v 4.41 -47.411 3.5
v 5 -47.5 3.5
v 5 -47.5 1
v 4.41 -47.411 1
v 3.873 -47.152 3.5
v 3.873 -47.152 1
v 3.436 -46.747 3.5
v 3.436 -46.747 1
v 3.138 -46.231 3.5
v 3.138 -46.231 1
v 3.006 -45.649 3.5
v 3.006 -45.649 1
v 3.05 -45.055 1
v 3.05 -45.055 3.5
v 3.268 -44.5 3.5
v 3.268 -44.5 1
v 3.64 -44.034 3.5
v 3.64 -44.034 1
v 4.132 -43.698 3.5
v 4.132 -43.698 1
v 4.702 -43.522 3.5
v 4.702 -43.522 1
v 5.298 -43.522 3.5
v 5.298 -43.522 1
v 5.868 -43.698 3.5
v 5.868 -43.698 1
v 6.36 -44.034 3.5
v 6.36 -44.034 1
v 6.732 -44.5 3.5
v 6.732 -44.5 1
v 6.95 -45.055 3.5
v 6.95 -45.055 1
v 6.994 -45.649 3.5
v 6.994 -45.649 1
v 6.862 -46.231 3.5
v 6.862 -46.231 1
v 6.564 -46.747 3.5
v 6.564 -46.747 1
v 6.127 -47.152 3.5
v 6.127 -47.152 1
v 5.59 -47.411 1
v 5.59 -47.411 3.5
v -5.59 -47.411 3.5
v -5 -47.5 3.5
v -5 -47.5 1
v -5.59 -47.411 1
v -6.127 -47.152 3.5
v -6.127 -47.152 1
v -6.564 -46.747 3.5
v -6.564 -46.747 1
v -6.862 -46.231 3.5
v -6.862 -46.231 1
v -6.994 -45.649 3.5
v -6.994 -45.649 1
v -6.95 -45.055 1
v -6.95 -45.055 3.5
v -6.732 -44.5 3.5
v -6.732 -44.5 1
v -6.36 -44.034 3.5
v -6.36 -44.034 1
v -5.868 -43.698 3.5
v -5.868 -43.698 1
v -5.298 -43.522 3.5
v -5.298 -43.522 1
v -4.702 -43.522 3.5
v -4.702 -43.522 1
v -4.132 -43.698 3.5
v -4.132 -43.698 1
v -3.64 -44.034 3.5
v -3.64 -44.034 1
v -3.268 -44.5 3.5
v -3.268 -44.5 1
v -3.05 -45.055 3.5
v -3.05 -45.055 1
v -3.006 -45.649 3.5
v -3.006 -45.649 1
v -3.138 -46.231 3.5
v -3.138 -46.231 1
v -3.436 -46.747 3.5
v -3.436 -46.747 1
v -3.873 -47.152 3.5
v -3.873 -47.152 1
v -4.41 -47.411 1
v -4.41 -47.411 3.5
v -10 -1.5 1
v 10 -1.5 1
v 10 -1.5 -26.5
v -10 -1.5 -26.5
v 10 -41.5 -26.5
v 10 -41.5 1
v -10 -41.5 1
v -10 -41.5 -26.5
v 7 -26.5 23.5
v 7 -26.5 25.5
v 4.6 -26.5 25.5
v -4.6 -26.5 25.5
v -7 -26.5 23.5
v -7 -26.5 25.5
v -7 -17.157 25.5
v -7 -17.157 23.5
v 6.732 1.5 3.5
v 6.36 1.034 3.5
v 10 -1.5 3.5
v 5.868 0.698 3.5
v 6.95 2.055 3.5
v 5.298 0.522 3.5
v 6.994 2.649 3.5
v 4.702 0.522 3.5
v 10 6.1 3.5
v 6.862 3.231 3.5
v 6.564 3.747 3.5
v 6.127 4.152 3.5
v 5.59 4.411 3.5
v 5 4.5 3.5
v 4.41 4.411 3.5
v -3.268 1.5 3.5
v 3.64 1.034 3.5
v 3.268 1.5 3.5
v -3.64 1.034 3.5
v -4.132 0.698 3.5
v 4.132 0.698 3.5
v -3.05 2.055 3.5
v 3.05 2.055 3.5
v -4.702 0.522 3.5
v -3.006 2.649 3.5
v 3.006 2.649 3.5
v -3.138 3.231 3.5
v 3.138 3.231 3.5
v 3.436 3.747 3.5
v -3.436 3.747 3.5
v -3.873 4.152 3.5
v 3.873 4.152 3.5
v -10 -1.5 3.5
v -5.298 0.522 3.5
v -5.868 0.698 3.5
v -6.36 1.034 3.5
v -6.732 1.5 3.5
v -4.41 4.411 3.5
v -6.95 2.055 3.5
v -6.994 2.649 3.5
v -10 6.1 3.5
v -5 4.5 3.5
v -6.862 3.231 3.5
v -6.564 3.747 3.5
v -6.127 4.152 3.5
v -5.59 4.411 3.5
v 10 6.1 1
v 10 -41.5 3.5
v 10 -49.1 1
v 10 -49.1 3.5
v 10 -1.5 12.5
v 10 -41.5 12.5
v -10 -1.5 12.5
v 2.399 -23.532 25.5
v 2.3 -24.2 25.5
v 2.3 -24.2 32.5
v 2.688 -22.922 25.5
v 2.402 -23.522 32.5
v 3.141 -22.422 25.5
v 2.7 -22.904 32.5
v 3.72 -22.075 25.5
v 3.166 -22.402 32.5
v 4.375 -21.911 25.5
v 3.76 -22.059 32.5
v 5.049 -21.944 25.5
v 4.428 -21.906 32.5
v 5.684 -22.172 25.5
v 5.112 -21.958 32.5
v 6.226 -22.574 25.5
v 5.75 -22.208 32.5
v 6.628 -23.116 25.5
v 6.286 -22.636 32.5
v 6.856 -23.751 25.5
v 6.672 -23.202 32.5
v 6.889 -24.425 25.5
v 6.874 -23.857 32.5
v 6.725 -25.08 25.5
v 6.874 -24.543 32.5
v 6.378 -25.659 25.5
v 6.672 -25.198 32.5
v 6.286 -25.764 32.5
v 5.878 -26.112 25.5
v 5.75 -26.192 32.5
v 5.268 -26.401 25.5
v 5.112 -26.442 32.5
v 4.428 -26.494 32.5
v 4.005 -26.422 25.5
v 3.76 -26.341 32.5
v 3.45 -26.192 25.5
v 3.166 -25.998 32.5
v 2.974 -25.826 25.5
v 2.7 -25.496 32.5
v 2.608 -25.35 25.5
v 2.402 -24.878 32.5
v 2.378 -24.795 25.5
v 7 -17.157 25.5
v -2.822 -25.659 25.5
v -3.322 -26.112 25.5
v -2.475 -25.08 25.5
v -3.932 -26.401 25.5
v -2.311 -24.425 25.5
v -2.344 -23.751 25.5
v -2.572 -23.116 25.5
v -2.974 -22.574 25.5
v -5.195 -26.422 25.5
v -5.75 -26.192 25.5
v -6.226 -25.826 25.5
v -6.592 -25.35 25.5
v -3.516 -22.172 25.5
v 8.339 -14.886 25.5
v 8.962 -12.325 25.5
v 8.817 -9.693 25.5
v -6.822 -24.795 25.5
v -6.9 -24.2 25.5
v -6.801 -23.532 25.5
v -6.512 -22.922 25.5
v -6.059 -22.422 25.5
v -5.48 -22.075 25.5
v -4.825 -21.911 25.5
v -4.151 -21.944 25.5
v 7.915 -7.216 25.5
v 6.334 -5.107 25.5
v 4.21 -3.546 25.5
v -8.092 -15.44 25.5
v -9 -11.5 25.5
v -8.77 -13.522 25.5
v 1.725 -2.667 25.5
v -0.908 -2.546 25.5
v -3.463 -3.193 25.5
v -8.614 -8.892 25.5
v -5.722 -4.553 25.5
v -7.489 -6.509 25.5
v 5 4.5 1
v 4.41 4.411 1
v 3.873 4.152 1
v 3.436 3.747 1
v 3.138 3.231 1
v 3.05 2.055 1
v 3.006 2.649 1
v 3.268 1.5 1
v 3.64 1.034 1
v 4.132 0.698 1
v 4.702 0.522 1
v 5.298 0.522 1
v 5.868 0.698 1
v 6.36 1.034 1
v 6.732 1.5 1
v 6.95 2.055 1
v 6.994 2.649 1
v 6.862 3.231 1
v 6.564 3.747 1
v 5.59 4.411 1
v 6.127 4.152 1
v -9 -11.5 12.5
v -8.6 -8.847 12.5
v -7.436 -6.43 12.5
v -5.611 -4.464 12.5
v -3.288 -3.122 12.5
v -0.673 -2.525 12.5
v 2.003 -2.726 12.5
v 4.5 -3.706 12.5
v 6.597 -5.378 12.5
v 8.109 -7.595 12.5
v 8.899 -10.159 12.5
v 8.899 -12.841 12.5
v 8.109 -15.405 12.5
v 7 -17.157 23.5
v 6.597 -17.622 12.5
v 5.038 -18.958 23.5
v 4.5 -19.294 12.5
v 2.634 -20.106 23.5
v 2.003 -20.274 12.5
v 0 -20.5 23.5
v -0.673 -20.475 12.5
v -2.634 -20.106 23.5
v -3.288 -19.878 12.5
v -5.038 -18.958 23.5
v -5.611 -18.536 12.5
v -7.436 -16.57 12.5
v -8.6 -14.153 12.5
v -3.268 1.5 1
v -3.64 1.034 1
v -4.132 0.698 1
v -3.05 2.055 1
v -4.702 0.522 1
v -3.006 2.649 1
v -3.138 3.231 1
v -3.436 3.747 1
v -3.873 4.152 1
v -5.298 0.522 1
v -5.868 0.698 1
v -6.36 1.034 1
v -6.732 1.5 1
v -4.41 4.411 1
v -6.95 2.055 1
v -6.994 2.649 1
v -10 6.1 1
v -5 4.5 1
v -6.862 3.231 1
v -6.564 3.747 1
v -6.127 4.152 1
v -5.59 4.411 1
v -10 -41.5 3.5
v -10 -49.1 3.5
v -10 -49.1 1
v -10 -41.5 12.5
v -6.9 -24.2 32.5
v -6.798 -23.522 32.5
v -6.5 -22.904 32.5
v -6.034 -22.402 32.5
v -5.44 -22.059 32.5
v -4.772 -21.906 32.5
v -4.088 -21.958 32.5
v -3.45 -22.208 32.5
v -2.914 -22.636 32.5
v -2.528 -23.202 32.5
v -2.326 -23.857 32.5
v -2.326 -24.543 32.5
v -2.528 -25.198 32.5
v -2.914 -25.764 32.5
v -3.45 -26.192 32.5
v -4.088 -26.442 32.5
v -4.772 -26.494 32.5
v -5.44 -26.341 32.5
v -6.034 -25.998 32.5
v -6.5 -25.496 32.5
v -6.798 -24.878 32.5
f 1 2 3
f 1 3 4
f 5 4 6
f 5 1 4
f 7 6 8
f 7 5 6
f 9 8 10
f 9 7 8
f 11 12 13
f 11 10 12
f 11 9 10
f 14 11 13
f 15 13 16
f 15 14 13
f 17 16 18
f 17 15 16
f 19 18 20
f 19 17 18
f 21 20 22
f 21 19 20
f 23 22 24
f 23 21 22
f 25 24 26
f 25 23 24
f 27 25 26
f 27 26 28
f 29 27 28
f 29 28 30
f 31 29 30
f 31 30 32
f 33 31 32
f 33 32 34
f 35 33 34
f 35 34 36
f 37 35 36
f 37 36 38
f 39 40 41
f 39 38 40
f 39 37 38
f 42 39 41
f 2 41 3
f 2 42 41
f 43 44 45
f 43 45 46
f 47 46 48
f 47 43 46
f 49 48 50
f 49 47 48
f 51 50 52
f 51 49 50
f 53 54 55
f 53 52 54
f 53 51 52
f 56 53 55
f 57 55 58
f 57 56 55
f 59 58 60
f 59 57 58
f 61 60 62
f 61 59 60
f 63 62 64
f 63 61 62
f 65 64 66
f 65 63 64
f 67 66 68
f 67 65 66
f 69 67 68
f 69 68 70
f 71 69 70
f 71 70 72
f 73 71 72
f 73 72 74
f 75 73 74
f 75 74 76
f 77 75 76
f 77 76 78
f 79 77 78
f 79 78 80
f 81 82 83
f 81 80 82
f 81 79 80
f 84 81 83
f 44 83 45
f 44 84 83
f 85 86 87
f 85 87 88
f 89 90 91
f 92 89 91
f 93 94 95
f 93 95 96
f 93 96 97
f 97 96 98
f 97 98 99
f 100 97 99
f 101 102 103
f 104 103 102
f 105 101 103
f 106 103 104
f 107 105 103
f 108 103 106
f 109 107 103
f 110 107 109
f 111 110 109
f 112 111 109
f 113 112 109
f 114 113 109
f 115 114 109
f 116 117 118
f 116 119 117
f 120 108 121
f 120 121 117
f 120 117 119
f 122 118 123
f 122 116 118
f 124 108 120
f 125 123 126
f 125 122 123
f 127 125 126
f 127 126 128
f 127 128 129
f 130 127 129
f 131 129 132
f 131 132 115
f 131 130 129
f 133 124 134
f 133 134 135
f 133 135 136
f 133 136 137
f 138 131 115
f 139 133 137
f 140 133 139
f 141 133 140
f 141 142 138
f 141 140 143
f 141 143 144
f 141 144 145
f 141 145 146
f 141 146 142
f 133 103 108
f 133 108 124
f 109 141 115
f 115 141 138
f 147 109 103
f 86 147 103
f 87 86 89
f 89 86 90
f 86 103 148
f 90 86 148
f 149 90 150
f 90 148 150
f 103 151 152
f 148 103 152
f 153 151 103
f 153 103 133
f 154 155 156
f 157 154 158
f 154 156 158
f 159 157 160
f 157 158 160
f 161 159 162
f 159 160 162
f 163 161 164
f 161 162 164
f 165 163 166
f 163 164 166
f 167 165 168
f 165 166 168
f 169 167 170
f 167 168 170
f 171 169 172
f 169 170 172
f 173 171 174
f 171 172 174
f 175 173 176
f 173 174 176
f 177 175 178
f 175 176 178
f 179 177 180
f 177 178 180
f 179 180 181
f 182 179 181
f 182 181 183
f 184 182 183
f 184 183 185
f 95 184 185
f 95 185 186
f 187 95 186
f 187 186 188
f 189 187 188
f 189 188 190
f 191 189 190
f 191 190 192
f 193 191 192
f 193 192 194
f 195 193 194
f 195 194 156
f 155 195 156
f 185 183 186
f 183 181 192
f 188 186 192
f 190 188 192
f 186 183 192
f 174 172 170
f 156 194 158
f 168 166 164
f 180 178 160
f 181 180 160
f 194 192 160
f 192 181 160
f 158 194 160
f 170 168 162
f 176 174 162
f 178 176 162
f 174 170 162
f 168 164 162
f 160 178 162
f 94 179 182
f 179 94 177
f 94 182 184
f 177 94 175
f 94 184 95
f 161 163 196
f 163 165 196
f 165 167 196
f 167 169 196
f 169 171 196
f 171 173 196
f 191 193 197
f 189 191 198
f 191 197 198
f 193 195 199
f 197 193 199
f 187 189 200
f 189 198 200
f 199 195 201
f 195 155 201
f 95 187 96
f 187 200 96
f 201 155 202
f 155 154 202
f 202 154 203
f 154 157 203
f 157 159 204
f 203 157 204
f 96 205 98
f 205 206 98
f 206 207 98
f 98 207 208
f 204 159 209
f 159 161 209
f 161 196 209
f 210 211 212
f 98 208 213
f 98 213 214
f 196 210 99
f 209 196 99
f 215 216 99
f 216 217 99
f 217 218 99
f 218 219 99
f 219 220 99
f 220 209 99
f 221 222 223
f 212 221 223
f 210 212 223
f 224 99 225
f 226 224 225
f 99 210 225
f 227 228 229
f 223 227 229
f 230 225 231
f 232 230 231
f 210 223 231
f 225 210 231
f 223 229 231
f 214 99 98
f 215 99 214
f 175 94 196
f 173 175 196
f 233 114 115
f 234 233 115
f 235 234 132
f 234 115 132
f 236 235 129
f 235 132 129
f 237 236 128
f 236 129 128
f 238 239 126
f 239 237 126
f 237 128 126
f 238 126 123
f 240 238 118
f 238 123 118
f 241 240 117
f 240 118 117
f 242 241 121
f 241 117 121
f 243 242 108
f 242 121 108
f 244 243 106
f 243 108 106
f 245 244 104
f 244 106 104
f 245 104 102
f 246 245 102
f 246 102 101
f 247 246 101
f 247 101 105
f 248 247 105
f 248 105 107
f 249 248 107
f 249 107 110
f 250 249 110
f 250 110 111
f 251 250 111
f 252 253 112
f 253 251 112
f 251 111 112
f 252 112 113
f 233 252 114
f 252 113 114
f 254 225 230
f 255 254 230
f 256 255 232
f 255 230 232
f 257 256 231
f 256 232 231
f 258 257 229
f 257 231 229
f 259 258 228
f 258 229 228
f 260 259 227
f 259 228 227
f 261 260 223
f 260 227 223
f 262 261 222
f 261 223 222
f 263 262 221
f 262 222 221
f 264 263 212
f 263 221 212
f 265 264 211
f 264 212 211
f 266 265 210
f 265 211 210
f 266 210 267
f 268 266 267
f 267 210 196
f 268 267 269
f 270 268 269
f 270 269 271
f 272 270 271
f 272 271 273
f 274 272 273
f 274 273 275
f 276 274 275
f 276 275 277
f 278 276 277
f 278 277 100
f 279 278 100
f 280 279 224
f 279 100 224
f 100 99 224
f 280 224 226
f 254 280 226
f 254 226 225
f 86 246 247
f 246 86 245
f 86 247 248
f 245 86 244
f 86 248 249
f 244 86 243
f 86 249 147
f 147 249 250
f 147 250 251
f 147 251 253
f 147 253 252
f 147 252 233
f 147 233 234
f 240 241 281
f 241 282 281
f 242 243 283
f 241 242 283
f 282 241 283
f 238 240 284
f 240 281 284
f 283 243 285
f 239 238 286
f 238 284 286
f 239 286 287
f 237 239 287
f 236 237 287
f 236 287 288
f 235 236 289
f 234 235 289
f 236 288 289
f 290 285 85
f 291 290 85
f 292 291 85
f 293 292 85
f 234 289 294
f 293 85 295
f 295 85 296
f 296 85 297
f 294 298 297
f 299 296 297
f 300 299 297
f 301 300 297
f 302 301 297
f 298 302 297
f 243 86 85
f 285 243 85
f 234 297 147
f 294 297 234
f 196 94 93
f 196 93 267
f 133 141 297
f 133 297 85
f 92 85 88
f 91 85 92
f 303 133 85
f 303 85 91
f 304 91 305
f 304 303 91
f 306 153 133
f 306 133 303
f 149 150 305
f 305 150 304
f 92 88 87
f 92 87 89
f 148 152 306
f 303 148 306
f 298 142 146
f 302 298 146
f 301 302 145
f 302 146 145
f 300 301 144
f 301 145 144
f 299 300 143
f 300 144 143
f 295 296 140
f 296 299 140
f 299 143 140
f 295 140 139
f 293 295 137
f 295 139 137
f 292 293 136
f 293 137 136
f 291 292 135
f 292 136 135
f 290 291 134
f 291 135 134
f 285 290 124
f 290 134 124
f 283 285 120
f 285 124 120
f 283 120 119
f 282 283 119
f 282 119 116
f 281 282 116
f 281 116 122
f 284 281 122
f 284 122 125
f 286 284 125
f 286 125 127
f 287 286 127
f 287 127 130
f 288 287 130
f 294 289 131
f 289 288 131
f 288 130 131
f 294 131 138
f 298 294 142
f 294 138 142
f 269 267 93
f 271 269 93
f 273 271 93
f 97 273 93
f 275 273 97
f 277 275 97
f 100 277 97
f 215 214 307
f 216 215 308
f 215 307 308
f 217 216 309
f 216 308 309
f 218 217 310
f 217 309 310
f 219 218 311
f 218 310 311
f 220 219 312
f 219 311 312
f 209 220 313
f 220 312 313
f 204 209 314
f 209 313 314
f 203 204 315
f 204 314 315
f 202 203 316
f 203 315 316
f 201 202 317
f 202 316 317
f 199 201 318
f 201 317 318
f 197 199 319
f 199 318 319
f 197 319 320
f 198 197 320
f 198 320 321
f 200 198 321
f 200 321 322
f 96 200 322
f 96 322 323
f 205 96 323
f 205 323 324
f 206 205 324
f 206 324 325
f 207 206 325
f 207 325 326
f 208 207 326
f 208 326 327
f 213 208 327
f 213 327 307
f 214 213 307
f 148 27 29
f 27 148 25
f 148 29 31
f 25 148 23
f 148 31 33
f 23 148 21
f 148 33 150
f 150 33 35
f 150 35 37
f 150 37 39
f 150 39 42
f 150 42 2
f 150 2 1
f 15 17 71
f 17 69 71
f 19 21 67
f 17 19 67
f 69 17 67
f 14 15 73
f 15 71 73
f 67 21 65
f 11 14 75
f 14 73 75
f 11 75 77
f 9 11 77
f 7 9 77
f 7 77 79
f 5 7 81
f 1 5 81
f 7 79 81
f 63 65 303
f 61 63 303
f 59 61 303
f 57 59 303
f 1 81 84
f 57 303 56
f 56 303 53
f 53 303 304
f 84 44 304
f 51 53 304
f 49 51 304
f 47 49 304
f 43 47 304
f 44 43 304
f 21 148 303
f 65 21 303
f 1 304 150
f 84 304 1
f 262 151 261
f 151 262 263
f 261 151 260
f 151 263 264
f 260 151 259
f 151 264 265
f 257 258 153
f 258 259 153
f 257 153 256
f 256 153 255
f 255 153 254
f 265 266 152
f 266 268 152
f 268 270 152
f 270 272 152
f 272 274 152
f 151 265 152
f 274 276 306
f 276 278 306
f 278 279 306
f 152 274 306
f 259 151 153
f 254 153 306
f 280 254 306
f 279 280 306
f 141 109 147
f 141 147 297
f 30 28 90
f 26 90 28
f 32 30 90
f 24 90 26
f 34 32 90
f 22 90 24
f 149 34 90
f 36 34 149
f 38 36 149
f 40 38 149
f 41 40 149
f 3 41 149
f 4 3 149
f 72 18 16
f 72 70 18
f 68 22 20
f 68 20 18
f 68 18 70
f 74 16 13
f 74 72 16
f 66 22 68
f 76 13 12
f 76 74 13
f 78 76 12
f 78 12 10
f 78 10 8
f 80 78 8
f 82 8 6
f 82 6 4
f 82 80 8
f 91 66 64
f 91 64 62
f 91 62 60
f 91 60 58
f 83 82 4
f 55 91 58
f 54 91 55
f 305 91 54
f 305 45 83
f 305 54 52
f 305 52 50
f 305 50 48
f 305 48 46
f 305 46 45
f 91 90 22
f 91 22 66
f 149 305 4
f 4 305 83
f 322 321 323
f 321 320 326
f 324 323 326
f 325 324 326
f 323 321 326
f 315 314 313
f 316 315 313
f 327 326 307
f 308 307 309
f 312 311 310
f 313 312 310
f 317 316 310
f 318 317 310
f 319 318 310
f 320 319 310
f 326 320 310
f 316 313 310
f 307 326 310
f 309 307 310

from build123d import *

# Parameters (mm, degrees)
CYLINDER001_R             = 2
CYLINDER001_DEPTH         = 10
CYLINDER_R                = 2
CYLINDER_DEPTH            = 10
BOX001_W                  = 7.6
BOX001_H                  = 20
BOX001_DEPTH              = 2.5
BOX_W                     = 40
BOX_H                     = 20
BOX_DEPTH                 = 39
BOX002_W                  = 14
BOX002_H                  = 16
BOX002_DEPTH              = 2
CYLINDER002_R             = 9
CYLINDER002_DEPTH         = 13
CYLINDER004_R             = 2.3
CYLINDER004_DEPTH         = 7
CYLINDER003_R             = 2.3
CYLINDER003_DEPTH         = 7
FUSION009_PLACEMENT_ANGLE = 90
BODY_ROLL_ANGLE           = 180
BODY_PLACEMENT_ANGLE      = -90


with BuildPart() as cylinder001:
    # Cylinder001 → Cylinder001 (new body)
    with BuildSketch(Plane(origin=(44, 15, 5), x_dir=(1, 0, 0), z_dir=(0, 0, 1))):
        Circle(CYLINDER001_R)
    extrude(amount=CYLINDER001_DEPTH)


with BuildPart() as fusion:
    # Cylinder → Cylinder (new body)
    with BuildSketch(Plane(origin=(44, 5, 5), x_dir=(1, 0, 0), z_dir=(0, 0, 1))):
        Circle(CYLINDER_R)
    extrude(amount=CYLINDER_DEPTH)

    # Fusion: union Cylinder001
    add(cylinder001.part)


with BuildPart() as cut:
    # Box001 → Box001 (new body)
    with BuildSketch(Plane(origin=(40, 0, 9), x_dir=(1, 0, 0), z_dir=(0, 0, 1))):
        with Locations((3.8, 10)):
            Rectangle(BOX001_W, BOX001_H)
    extrude(amount=BOX001_DEPTH)

    # Cut: cut Fusion
    add(fusion.part, mode=Mode.SUBTRACT)


with BuildPart() as cut_1:
    # Cut placement: moved
    add(cut.part.moved(Location((-10, -10, 0))))


with BuildPart() as part_mirroring:
    # Part__Mirroring: instance of Cut
    add(cut_1.part.mirror(Plane(origin=(0, 0, 0), x_dir=(0, -1, 0), z_dir=(1, 0, 0))))


with BuildPart() as part_mirroring_1:
    # Part__Mirroring placement: moved
    add(part_mirroring.part.moved(Location((20, 0, 0))))


with BuildPart() as fusion010:
    # Box → Box (new body)
    with BuildSketch(Plane(origin=(-10, -10, 0), x_dir=(1, 0, 0), z_dir=(0, 0, 1))):
        with Locations((20, 10)):
            Rectangle(BOX_W, BOX_H)
    extrude(amount=BOX_DEPTH)

    # Fusion010: union Part__Mirroring, Cut
    add(part_mirroring_1.part)
    add(cut_1.part)


with BuildPart() as cube002:
    # Box002 → Box002 (new body)
    with BuildSketch(Plane(origin=(-7, -15, 0), x_dir=(1, 0, 0), z_dir=(0, 0, 1))):
        with Locations((7, 8)):
            Rectangle(BOX002_W, BOX002_H)
    extrude(amount=BOX002_DEPTH)


with BuildPart() as shaft:
    # Cylinder002 → Cylinder002 (new body)
    with BuildSketch(Plane.XY):
        Circle(CYLINDER002_R)
    extrude(amount=CYLINDER002_DEPTH)


with BuildPart() as cylinder004:
    # Cylinder004 → Cylinder004 (new body)
    with BuildSketch(Plane(origin=(4.6, -12.7, -7), x_dir=(1, 0, 0), z_dir=(0, 0, 1))):
        Circle(CYLINDER004_R)
    extrude(amount=CYLINDER004_DEPTH)


with BuildPart() as servo:
    # Cylinder003 → Cylinder003 (new body)
    with BuildSketch(Plane(origin=(-4.6, -12.7, -7), x_dir=(1, 0, 0), z_dir=(0, 0, 1))):
        Circle(CYLINDER003_R)
    extrude(amount=CYLINDER003_DEPTH)

    # Fusion009: union Cube002, shaft, Cylinder004
    add(cube002.part)
    add(shaft.part)
    add(cylinder004.part)


with BuildPart() as servo_1:
    # Fusion009 placement: moved
    add(servo.part.moved(Location((0, 0, -13))).rotate(Axis((0, 0, -13), (0, 0, 1)), FUSION009_PLACEMENT_ANGLE))

    # Fusion011: union Fusion010
    add(fusion010.part)


with BuildPart() as servo_2:
    # Fusion011 placement: moved
    add(servo_1.part.moved(Location((10, 10, 0))))


with BuildPart() as servo_3:
    # Body roll: moved
    add(servo_2.part.rotate(Axis((0, 0, 0), (1, 0, 0)), BODY_ROLL_ANGLE))


with BuildPart() as servo_4:
    # Body placement: moved
    add(servo_3.part.moved(Location((10, -1.5, 12.5))).rotate(Axis((10, -1.5, 12.5), (0, 0, 1)), BODY_PLACEMENT_ANGLE))


solid = servo_4.part
